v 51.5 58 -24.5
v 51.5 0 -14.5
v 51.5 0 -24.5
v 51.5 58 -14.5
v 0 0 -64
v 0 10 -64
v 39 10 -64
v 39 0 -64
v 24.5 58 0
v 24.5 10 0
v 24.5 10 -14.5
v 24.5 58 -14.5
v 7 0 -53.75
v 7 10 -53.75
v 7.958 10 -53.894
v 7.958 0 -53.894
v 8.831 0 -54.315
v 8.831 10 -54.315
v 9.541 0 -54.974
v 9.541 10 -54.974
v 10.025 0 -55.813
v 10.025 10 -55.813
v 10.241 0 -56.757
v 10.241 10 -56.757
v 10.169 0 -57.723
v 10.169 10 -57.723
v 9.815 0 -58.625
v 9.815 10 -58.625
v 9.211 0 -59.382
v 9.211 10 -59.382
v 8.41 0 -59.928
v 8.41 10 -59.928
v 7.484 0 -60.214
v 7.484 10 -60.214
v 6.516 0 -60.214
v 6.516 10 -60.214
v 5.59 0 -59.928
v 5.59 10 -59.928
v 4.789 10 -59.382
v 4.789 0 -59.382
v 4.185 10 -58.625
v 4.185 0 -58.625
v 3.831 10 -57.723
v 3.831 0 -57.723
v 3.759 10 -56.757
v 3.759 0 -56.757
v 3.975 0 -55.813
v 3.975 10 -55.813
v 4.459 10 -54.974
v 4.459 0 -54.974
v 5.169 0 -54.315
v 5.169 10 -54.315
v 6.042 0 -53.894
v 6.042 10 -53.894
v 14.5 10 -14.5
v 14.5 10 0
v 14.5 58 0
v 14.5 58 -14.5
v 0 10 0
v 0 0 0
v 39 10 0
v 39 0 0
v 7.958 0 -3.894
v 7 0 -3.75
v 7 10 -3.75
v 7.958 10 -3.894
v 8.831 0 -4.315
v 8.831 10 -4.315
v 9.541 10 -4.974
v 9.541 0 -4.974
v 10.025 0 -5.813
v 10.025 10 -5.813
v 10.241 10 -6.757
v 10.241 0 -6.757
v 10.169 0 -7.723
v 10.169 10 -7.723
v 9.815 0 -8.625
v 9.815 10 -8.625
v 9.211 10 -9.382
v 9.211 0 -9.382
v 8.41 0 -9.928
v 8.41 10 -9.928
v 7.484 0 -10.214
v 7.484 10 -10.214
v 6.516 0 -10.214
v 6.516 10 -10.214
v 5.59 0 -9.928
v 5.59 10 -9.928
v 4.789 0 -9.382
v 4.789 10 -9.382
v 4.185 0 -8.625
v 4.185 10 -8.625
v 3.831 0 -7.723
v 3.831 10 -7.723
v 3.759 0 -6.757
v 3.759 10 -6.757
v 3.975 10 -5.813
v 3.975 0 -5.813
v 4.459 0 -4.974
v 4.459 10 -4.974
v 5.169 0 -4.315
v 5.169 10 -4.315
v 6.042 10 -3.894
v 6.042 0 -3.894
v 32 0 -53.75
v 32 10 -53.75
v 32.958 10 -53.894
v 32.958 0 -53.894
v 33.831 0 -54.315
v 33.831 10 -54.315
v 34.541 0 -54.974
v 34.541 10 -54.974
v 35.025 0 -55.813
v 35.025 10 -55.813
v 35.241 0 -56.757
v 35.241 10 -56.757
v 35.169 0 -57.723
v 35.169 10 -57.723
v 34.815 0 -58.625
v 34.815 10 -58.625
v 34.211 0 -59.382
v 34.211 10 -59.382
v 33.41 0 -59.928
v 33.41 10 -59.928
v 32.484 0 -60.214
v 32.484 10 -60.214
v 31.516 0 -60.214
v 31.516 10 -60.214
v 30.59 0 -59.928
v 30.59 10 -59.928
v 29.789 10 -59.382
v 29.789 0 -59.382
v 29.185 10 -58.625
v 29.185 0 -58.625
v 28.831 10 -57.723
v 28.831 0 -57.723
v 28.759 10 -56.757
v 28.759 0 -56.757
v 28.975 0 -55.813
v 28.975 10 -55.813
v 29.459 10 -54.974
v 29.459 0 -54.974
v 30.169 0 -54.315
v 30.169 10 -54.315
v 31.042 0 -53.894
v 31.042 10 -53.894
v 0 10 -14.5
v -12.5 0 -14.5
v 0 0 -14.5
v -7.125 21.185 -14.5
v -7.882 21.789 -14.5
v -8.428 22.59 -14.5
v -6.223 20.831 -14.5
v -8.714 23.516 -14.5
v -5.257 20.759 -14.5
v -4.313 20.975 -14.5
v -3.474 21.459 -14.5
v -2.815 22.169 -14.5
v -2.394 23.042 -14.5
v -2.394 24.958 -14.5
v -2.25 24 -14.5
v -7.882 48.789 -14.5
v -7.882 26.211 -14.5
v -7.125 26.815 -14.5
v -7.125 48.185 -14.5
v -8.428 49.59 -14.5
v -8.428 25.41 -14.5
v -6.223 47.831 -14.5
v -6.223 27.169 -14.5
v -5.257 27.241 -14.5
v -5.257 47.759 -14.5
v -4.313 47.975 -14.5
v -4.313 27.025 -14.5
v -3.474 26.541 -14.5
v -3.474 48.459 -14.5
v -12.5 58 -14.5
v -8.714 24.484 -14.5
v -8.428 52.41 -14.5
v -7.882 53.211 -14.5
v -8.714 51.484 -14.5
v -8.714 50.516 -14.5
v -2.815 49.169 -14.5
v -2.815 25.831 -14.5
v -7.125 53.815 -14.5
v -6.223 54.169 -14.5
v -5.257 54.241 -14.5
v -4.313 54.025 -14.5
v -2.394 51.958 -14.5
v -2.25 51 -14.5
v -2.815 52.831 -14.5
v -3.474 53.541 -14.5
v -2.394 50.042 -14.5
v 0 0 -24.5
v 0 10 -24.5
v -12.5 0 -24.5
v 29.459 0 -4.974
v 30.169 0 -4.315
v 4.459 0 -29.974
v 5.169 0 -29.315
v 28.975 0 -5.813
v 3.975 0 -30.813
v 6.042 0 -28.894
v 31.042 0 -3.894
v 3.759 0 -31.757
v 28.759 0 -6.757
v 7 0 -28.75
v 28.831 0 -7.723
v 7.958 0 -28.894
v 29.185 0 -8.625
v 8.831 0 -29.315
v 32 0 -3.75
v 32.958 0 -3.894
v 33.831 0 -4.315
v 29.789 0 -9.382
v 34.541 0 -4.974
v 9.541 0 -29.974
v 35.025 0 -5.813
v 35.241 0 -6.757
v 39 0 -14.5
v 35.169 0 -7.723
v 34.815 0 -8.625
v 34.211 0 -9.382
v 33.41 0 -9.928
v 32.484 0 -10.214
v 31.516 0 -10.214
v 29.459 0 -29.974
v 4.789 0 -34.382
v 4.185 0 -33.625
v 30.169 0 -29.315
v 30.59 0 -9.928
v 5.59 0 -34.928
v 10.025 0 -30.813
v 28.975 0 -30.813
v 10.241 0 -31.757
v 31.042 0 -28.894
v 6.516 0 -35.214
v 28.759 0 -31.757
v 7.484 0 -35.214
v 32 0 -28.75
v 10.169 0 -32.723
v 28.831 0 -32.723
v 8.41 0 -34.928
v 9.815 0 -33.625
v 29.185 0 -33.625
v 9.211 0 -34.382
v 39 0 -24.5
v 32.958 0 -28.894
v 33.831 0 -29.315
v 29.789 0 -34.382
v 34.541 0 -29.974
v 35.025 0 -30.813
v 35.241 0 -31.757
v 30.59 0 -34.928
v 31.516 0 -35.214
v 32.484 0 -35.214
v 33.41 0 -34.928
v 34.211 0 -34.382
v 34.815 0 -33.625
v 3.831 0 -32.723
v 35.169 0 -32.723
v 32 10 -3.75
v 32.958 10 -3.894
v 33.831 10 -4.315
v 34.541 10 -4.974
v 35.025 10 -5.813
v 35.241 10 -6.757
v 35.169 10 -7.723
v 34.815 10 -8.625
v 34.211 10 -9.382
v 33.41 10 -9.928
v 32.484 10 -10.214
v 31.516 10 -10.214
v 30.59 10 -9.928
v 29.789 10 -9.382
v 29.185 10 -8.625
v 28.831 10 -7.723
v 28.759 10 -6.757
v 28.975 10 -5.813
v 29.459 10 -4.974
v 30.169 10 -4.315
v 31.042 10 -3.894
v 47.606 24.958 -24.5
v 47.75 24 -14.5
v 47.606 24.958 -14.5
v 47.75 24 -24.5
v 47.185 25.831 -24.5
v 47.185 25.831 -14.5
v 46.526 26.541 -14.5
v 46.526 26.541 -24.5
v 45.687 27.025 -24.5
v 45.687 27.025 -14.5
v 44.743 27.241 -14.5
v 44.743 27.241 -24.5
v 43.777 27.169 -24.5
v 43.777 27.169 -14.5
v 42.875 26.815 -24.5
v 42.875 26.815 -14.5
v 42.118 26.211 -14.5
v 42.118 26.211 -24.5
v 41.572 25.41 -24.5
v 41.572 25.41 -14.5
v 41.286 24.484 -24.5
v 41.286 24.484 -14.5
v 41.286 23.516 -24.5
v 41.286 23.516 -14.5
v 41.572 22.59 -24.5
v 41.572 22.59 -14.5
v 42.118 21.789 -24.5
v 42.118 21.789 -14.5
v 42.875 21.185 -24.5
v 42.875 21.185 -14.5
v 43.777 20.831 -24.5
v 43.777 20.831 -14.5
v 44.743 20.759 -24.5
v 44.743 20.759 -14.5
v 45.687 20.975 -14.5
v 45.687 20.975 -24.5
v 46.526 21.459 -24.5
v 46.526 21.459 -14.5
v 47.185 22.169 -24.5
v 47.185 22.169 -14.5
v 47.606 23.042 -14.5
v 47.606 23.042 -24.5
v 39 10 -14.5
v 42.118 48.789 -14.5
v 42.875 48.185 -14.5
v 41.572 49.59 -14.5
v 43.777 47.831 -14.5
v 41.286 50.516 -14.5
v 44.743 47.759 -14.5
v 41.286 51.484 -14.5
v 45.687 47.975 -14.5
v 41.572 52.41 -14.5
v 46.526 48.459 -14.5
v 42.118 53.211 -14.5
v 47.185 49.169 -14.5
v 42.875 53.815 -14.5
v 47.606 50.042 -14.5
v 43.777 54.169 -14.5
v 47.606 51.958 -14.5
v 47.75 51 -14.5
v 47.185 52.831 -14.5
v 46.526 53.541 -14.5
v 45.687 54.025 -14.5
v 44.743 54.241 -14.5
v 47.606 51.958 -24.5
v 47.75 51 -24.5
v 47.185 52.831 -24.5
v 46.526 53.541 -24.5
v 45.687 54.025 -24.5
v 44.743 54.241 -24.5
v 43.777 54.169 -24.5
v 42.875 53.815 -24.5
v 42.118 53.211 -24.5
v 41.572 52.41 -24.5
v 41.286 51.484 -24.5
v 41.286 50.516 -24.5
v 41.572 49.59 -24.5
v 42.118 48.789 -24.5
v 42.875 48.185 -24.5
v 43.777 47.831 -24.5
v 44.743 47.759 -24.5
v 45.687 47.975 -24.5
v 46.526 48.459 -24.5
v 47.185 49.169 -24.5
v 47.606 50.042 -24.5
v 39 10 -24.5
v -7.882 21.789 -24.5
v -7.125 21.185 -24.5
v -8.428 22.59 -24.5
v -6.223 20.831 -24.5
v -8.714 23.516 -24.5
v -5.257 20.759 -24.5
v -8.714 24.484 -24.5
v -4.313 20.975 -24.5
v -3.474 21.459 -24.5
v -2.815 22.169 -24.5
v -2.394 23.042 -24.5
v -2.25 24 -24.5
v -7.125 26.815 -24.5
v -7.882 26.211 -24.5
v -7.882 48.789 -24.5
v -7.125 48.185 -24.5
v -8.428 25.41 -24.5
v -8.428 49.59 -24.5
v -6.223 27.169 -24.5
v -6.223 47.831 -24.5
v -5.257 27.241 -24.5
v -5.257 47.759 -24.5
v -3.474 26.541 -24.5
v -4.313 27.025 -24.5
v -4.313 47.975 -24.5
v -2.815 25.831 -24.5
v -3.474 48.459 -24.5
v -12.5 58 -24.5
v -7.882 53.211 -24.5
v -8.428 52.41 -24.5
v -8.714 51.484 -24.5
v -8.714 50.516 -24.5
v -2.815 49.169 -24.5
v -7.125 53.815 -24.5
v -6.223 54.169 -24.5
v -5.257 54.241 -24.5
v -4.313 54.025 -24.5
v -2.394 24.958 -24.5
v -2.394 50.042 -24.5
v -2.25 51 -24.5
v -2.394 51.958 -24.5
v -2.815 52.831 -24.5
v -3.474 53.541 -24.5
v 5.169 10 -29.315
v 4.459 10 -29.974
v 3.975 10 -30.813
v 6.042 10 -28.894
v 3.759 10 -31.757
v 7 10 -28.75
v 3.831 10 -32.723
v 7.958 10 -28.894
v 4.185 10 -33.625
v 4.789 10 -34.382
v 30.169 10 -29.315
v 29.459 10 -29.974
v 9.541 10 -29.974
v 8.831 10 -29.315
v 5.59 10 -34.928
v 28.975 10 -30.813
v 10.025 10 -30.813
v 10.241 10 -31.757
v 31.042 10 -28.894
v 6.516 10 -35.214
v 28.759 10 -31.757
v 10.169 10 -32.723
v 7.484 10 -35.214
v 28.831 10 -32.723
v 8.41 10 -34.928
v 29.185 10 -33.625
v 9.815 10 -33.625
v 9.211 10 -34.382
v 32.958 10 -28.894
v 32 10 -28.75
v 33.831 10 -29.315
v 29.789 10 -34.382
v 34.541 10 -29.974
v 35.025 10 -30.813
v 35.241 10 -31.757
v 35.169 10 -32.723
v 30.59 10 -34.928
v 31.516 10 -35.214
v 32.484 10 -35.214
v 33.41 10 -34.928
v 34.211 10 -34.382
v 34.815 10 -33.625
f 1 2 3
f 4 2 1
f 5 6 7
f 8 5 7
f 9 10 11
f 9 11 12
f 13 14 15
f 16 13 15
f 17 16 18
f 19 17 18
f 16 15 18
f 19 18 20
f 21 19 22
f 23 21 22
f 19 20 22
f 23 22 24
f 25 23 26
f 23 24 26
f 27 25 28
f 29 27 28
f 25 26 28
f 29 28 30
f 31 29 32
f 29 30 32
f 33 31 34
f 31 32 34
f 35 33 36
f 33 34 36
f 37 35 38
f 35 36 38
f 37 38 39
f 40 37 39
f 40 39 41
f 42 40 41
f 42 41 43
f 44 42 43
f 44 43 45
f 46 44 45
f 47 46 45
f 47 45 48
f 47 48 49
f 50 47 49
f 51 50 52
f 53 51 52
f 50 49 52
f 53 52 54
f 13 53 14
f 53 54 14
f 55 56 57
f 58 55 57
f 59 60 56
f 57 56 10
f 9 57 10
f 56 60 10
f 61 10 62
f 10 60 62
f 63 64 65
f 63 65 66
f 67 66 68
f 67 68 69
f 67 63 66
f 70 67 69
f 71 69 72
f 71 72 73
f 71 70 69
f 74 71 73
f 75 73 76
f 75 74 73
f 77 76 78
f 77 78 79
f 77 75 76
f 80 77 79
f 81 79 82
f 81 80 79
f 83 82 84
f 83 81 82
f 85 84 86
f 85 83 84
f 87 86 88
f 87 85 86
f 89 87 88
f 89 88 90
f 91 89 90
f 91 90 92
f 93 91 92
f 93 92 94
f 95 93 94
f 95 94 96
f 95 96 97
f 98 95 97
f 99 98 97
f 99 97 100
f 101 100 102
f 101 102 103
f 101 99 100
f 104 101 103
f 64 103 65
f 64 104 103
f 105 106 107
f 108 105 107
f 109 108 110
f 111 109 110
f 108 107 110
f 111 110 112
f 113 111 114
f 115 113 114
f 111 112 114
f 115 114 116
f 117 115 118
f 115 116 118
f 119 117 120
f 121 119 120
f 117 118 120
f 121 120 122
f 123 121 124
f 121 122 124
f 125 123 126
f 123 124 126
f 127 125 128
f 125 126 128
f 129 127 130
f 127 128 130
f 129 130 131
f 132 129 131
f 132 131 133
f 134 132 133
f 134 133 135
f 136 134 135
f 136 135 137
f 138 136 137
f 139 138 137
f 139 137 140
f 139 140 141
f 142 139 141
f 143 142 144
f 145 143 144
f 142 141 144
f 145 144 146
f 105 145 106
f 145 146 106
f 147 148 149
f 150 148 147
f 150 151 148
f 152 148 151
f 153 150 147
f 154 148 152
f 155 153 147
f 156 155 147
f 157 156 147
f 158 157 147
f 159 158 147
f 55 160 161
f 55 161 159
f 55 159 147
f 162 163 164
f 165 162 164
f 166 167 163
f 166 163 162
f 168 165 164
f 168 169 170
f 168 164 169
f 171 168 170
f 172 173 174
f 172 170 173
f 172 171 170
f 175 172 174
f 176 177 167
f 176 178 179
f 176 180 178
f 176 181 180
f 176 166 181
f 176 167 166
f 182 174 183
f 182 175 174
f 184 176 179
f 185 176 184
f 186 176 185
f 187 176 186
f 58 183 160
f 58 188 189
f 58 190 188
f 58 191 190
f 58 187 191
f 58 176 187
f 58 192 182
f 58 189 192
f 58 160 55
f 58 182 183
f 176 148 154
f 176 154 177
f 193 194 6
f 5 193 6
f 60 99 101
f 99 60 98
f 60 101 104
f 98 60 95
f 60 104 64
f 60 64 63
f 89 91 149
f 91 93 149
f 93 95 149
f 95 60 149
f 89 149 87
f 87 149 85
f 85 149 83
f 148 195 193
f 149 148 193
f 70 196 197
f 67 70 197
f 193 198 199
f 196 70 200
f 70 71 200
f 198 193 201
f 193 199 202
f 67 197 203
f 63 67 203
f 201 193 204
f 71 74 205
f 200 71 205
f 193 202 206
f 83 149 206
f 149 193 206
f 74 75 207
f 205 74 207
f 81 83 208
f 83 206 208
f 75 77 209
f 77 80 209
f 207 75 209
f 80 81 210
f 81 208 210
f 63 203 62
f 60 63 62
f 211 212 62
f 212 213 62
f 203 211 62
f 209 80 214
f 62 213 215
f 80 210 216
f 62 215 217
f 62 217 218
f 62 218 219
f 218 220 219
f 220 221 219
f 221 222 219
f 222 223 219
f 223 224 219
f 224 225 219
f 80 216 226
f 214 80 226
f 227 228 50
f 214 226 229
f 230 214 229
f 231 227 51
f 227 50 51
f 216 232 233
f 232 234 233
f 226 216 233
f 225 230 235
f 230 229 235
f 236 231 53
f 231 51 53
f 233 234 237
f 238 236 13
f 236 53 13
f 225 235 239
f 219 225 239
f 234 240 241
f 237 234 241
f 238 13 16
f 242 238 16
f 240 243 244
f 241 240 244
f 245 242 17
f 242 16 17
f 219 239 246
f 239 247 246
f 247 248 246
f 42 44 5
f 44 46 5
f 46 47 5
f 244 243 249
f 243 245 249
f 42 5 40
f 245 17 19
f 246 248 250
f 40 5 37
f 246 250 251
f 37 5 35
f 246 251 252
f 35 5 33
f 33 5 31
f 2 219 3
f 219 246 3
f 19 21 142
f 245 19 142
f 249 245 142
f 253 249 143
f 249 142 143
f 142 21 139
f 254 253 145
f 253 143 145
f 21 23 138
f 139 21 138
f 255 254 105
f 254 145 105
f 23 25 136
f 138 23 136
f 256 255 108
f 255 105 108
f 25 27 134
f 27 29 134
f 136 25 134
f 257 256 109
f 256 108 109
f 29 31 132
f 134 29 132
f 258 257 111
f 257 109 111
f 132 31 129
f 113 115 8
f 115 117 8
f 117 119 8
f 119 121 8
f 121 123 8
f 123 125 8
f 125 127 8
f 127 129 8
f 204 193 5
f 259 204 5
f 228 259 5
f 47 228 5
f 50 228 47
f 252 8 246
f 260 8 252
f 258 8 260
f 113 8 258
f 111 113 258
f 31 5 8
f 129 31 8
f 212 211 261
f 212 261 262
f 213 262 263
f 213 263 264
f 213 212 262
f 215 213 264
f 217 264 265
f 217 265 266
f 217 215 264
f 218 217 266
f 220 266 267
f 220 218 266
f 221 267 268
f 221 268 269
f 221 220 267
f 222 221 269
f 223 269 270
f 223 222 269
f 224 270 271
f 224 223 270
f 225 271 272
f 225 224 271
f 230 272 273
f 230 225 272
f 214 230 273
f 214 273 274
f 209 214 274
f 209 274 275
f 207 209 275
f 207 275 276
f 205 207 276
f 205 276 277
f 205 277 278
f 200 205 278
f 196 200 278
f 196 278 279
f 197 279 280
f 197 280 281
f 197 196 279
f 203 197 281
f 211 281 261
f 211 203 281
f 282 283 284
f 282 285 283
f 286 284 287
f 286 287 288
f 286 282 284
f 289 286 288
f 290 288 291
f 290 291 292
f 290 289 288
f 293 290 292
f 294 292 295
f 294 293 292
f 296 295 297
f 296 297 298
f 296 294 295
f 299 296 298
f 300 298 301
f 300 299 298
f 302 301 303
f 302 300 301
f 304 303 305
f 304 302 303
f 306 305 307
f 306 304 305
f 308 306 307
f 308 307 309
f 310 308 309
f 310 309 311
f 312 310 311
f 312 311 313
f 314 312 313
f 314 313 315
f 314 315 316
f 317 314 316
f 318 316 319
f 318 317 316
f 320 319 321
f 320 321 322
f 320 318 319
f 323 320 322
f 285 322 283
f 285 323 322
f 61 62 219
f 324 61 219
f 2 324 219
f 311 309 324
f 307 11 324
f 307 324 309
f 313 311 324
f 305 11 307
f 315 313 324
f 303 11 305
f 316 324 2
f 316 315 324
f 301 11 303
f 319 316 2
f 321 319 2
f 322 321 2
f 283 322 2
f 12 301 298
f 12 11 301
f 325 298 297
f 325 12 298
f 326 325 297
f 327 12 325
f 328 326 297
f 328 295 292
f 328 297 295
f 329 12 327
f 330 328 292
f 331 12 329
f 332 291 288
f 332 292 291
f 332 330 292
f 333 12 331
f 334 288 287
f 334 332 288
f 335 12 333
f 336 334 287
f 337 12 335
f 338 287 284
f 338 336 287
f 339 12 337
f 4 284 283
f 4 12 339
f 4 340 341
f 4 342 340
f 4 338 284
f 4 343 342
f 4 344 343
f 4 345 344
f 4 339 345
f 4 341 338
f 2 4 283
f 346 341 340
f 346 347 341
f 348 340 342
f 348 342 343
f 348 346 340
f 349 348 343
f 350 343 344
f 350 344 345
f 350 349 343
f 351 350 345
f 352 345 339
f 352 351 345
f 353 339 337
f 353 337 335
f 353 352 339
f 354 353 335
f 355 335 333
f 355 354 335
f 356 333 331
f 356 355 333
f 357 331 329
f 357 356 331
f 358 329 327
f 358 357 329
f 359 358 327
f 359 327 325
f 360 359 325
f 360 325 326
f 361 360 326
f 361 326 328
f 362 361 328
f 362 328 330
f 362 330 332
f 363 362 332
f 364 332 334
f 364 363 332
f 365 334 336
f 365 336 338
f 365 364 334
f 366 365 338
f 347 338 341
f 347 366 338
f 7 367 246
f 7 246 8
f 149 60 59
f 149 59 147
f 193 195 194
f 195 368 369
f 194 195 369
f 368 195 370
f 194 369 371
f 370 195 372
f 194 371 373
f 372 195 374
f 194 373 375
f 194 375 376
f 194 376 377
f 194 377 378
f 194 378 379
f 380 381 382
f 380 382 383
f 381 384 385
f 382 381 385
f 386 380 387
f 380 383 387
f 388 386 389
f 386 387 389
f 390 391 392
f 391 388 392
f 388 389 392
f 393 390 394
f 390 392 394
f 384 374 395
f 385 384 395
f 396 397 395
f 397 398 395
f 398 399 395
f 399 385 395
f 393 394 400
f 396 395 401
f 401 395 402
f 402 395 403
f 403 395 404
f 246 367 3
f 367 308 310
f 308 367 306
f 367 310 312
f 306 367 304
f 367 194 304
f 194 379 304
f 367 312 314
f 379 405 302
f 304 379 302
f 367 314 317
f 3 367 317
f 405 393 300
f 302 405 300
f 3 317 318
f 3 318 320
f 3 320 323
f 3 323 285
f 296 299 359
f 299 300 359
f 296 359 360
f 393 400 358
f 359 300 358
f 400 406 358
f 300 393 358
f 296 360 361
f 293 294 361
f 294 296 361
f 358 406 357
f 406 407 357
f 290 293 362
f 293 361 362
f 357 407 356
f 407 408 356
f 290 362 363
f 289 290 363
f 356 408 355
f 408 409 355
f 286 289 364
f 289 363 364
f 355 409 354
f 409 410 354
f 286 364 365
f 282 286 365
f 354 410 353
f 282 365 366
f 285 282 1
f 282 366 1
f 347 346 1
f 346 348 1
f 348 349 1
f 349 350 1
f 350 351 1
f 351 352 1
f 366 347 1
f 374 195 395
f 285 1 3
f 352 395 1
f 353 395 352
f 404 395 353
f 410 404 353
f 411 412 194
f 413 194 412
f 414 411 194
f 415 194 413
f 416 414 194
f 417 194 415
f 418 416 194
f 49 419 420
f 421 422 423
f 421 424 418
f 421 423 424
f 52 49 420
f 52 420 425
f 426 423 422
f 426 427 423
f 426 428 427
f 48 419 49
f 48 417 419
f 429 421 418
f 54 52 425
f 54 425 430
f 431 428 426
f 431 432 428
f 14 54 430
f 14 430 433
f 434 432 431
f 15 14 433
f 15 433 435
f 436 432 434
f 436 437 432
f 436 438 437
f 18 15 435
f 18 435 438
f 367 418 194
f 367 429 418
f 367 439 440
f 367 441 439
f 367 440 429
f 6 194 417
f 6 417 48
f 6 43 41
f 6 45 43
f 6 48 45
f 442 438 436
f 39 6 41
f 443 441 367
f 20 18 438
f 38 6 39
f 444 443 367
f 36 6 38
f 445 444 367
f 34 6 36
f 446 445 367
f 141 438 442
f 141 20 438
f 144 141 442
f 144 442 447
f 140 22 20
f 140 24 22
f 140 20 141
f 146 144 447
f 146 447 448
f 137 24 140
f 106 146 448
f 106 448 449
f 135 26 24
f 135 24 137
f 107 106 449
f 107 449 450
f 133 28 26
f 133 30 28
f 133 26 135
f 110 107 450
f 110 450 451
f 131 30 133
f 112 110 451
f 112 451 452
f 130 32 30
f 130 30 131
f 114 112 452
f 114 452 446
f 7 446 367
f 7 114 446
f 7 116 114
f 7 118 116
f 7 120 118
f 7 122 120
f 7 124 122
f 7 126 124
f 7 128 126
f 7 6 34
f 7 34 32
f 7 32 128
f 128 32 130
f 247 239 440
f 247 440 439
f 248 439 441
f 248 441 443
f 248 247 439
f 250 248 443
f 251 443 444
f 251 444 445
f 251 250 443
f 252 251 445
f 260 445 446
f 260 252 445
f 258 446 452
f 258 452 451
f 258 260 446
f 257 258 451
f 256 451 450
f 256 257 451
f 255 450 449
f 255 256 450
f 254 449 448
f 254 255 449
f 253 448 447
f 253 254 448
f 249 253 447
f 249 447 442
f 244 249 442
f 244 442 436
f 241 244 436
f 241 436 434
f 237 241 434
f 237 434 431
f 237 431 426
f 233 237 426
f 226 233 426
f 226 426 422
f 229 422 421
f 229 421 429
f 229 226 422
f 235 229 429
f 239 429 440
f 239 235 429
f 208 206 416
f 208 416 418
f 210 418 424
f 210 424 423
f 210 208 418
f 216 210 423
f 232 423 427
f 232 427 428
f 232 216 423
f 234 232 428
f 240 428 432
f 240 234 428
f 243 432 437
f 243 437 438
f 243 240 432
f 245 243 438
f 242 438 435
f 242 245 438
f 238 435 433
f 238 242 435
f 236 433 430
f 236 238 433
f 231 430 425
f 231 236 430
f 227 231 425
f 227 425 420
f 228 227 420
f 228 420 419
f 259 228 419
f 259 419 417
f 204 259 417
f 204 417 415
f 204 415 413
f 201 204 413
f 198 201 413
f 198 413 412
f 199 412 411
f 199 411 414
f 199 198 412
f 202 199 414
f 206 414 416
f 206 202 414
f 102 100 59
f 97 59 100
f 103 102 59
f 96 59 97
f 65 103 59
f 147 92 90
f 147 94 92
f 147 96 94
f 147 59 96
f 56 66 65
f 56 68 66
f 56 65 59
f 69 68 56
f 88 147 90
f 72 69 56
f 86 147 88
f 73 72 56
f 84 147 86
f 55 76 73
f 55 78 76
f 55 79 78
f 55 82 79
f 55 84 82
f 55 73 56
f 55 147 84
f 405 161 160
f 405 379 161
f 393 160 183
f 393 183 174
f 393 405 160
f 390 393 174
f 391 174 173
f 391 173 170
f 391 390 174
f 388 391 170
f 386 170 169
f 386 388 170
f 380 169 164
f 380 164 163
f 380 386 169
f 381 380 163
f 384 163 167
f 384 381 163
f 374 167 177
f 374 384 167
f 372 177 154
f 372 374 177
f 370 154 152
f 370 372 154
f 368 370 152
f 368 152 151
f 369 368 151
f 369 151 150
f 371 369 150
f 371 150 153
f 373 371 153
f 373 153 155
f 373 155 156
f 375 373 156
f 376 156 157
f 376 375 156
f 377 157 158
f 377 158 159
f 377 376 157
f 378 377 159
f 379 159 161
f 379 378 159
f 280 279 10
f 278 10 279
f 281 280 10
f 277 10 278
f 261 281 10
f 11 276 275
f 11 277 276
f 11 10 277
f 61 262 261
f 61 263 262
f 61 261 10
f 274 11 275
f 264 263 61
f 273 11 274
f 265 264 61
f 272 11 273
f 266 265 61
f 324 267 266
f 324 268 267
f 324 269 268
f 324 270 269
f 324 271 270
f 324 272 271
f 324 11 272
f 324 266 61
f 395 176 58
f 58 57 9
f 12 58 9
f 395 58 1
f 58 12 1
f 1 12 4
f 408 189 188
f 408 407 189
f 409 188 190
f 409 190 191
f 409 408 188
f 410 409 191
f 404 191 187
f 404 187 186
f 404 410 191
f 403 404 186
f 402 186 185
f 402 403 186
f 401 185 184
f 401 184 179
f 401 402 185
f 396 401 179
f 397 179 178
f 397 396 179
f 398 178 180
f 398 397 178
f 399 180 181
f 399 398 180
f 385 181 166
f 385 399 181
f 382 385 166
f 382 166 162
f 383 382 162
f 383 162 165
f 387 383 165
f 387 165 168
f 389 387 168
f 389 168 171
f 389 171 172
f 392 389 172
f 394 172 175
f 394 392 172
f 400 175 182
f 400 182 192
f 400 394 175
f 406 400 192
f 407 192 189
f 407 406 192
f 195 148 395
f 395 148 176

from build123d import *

# Parameters (mm, degrees)
SKETCH1_W           = 39
SKETCH1_H           = 39
SKETCH1_R           = 3.25
BOSS_EXTRUDE1_DEPTH = 10
SKETCH2_W           = 64
SKETCH2_H           = 58
SKETCH2_R           = 3.25
BOSS_EXTRUDE2_DEPTH = 5
BOSS_EXTRUDE3_REACH = 88.817
SKETCH3_W           = 10
SKETCH3_H           = 48
SKETCH5_W           = 39
SKETCH5_H           = 25
SKETCH5_R           = 3.25
BOSS_EXTRUDE4_DEPTH = 10


with BuildPart() as part:
    # Sketch1 → Boss-Extrude1 (new body)
    with BuildSketch(Plane(origin=(0, 0, 0), x_dir=(1, 0, 0), z_dir=(0, 1, 0))):
        with Locations((19.5, 19.5)):
            Rectangle(SKETCH1_W, SKETCH1_H)
        with Locations(Location((7, 32, 0), (0, 0, 270))):
            Circle(SKETCH1_R, mode=Mode.SUBTRACT)
        with Locations(Location((32, 32, 0), (0, 0, 270))):
            Circle(SKETCH1_R, mode=Mode.SUBTRACT)
        with Locations(Location((32, 7, 0), (0, 0, 270))):
            Circle(SKETCH1_R, mode=Mode.SUBTRACT)
        with Locations(Location((7, 7, 0), (0, 0, 270))):
            Circle(SKETCH1_R, mode=Mode.SUBTRACT)
    extrude(amount=BOSS_EXTRUDE1_DEPTH)

    # Sketch2 → Boss-Extrude2 (add, symmetric)
    with BuildSketch(Plane.XY.offset(-19.5)):
        with Locations((19.5, 29)):
            Rectangle(SKETCH2_W, SKETCH2_H)
        with Locations((-5.5, 51)):
            Circle(SKETCH2_R, mode=Mode.SUBTRACT)
        with Locations((44.5, 51)):
            Circle(SKETCH2_R, mode=Mode.SUBTRACT)
        with Locations((-5.5, 24)):
            Circle(SKETCH2_R, mode=Mode.SUBTRACT)
        with Locations((44.5, 24)):
            Circle(SKETCH2_R, mode=Mode.SUBTRACT)
    extrude(amount=BOSS_EXTRUDE2_DEPTH, both=True)

    # Sketch3 → Boss-Extrude3 (add, up to next)
    with BuildSketch(Plane.XY, mode=Mode.PRIVATE) as boss_extrude3_sk1:
        with Locations((19.5, 34)):
            Rectangle(SKETCH3_W, SKETCH3_H)
    boss_extrude3_tool1 = extrude(boss_extrude3_sk1.sketch, amount=-BOSS_EXTRUDE3_REACH, mode=Mode.PRIVATE) - part.part
    add(boss_extrude3_tool1.solids().sort_by_distance((19.5, 34, 0))[0])

    # Sketch5 → Boss-Extrude4 (add)
    with BuildSketch(Plane(origin=(0, 10, 0), x_dir=(1, 0, 0), z_dir=(0, 1, 0))):
        with Locations((19.5, 51.5)):
            Rectangle(SKETCH5_W, SKETCH5_H)
        with Locations(Location((7, 57, 0), (0, 0, 270))):
            Circle(SKETCH5_R, mode=Mode.SUBTRACT)
        with Locations(Location((32, 57, 0), (0, 0, 270))):
            Circle(SKETCH5_R, mode=Mode.SUBTRACT)
    extrude(amount=-BOSS_EXTRUDE4_DEPTH)


solid = part.part
